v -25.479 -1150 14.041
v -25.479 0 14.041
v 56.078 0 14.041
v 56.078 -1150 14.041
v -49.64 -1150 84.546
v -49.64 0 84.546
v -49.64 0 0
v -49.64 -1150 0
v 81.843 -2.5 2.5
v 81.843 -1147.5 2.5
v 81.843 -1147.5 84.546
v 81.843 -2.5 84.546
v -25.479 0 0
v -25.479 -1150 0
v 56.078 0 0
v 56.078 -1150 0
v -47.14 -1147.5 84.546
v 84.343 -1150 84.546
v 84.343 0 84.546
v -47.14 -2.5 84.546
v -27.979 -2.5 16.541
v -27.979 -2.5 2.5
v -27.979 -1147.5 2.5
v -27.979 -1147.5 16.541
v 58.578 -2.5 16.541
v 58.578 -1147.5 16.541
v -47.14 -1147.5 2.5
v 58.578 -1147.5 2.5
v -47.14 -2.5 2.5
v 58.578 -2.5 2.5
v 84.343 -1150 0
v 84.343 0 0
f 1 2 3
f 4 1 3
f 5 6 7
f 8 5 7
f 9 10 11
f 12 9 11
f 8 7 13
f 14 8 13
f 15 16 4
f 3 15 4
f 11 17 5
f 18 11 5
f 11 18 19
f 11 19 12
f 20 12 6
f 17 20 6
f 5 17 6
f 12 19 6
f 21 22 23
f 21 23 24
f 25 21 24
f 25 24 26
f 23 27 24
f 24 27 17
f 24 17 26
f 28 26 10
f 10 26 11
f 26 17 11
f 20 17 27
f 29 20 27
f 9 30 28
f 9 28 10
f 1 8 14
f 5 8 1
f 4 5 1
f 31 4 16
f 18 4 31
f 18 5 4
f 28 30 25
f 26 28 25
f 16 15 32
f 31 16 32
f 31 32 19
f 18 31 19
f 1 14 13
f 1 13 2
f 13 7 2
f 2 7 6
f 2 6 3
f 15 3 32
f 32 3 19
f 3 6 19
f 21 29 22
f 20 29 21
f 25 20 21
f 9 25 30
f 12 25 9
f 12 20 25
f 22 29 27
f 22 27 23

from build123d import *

# Parameters (mm, degrees)
F0_W     = 24.1608545184
F0_H     = 14.0407383442
F0_W_2   = 28.265745379
F1_DEPTH = 1150
F2_T     = -2.5


with BuildPart() as f1:
    # F0 (on Front) → F1 (new body)
    with BuildSketch(Plane.XZ):
        Polygon((-49.6395677328, 42.5944775343), (-49.6395677328, 14.0407383442), (-25.4787132144, 14.0407383442), (27.8118383139, 14.0407383442), (56.077583693, 14.0407383442), (84.343329072, 14.0407383442), (84.343329072, 84.5464840531), (-49.6395677328, 84.5464840531), align=None)
        with Locations((-37.5591404736, 7.0203691721)):
            Rectangle(F0_W, F0_H)
        with Locations((70.2104563825, 7.0203691721)):
            Rectangle(F0_W_2, F0_H)
    extrude(amount=F1_DEPTH)

    # F2
    f2_openings = [f1.faces().sort_by_distance(p)[0] for p in [
        (17.351881, -575, 84.546484),
    ]]
    offset(amount=F2_T, openings=f2_openings, kind=Kind.INTERSECTION)


solid = f1.part
